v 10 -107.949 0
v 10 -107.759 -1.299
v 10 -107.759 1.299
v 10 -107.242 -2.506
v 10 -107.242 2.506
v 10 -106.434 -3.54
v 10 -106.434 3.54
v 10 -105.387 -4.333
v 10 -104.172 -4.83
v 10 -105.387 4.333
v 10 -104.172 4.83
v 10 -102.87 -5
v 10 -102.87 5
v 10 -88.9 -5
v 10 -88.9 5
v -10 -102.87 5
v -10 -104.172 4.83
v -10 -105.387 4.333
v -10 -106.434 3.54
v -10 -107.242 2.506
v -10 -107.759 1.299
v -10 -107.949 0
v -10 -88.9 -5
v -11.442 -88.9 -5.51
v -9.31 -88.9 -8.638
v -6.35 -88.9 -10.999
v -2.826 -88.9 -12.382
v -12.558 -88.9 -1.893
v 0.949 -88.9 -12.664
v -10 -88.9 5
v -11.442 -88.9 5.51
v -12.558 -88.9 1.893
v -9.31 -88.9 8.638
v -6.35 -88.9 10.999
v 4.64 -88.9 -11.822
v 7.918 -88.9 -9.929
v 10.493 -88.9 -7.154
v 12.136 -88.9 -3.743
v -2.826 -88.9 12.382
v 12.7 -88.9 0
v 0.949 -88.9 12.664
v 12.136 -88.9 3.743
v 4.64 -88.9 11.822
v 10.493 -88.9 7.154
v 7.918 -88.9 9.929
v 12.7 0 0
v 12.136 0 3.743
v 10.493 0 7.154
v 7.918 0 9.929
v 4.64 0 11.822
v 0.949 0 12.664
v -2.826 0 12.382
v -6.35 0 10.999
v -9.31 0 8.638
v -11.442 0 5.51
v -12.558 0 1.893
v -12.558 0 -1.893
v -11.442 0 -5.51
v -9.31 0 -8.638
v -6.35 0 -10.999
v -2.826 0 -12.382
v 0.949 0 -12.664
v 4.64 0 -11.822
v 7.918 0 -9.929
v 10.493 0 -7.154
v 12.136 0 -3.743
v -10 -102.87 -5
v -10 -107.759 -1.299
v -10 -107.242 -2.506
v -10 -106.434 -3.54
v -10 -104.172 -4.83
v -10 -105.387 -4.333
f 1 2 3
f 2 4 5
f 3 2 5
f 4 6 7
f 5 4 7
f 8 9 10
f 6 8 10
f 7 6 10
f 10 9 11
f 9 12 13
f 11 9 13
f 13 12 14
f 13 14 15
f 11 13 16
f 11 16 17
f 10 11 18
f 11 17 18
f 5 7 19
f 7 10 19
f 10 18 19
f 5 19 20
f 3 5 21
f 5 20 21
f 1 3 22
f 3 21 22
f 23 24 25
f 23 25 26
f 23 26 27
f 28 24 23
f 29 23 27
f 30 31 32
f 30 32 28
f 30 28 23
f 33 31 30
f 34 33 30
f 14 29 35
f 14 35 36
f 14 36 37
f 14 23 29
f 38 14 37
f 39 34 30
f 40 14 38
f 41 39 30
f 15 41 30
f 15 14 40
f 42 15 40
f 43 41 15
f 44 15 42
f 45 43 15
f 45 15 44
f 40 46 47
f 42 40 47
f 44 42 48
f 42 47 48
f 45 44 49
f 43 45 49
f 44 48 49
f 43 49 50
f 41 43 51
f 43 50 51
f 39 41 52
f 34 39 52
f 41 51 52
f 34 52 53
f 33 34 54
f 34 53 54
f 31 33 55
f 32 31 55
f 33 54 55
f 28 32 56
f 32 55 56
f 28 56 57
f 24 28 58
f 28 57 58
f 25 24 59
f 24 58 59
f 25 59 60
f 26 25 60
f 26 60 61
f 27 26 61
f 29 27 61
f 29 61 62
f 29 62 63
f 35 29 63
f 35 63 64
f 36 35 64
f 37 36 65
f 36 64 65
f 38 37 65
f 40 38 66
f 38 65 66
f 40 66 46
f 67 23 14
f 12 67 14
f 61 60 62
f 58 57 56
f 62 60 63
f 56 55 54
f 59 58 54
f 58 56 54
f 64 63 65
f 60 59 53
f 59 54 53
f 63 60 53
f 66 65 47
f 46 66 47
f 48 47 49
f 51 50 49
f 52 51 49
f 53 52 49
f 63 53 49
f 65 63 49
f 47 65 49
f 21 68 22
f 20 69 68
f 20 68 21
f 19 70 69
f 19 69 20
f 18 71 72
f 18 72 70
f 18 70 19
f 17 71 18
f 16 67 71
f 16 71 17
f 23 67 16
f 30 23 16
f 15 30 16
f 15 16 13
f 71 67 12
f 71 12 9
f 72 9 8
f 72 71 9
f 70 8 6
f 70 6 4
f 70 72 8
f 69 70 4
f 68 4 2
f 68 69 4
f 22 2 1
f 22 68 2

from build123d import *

# Parameters (mm, degrees)
F0_R        = 12.7
F1_DEPTH    = 88.9
F2_W        = 20
F2_H        = 10
F3_DEPTH    = 19.05
F4_T1_DEPTH = 45.4


# Not quite as in the source:
# - a fillet or chamfer that OpenCascade refuses, or shapes differently, is made with other operations: its cross-section is extruded or revolved along the edge and cut away or added


with BuildPart() as f1:
    # F0 (on Front) → F1 (new body)
    with BuildSketch(Plane.XZ):
        Circle(F0_R)
    extrude(amount=F1_DEPTH)

    # F2 (on face) → F3 (join)
    with BuildSketch(Plane.XZ.offset(88.9)):
        Rectangle(F2_W, F2_H)
    extrude(amount=F3_DEPTH)

    # F4: fillet of radius 5.08 on 2 edges, made by hand

    # F4_s2 → F4_t1 (cut)
    with BuildSketch(Plane.YZ.offset(-22.7)):
        with BuildLine():
            ThreePointArc((-102.87, 5), (-106.4621024484, 3.5121024484), (-107.95, -0.08))
            Line((-107.95, -0.08), (-107.95, 5))
            Line((-107.95, 5), (-102.87, 5))
        make_face()
        with BuildLine():
            ThreePointArc((-102.87, -5), (-106.4621024484, -3.5121024484), (-107.95, 0.08))
            Line((-107.95, 0.08), (-107.95, -5))
            Line((-107.95, -5), (-102.87, -5))
        make_face()
    extrude(amount=F4_T1_DEPTH, mode=Mode.SUBTRACT)


solid = f1.part
